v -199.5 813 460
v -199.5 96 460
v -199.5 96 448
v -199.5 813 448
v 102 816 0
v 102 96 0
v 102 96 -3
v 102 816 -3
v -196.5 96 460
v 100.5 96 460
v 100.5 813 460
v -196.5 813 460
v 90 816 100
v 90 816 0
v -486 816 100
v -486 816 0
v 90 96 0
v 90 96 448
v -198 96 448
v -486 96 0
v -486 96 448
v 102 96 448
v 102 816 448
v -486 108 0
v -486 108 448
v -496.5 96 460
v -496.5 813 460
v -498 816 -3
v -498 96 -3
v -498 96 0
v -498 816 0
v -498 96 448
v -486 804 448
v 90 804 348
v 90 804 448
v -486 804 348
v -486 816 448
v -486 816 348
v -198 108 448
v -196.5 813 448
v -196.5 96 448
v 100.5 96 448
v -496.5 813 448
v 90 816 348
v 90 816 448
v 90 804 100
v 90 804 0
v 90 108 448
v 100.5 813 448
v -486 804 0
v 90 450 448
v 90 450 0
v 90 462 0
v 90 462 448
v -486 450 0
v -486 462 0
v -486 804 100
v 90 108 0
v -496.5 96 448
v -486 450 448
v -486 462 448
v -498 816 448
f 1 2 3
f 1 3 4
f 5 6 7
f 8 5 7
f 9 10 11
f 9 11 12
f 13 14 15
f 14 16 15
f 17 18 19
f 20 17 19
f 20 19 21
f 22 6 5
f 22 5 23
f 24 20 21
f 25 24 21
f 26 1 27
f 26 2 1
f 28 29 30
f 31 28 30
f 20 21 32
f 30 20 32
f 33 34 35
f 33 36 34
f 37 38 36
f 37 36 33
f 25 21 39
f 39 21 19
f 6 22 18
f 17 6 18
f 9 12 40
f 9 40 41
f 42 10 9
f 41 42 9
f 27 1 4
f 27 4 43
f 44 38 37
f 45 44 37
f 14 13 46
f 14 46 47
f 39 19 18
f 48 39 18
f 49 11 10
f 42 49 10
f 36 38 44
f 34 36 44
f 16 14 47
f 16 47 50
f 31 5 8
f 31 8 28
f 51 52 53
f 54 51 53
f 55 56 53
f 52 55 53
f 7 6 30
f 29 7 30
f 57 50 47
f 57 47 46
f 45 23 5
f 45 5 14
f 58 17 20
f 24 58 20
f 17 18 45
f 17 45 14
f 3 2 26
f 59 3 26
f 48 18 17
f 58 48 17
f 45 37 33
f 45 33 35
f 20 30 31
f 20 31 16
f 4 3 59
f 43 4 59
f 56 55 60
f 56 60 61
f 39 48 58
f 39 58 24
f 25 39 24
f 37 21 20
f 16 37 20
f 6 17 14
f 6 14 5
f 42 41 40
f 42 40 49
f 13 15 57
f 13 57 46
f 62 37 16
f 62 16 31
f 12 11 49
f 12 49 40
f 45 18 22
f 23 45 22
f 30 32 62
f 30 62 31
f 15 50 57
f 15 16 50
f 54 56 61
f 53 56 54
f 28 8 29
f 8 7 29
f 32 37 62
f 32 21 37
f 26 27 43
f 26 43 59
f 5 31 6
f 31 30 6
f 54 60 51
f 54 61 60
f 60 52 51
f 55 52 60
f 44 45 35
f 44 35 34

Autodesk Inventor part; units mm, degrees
ref_plane "YZ Plane" through (0, 0, 0) normal (1, 0, 0) x (0, 1, 0)
sketch "Sketch1" plane through (0, 0, 0) normal (0, 0, 1) x (1, 0, 0)
  line L0 (-1498, 0) -> (1498, 0) construction
  line L1 (-1498, 0) -> (-898, 0)
  line L2 (-898, 0) -> (-898, 2068)
  line L3 (-898, 2068) -> (-1498, 2068)
  line L4 (-1498, 2068) -> (-1498, 0)
  line L5 (-898, 0) -> (-498, 0)
  line L6 (-498, 0) -> (-498, 816)
  line L7 (-498, 816) -> (-898, 816)
  line L8 (-898, 816) -> (-898, 0)
  line L9 (-498, 0) -> (102, 0)
  line L10 (102, 0) -> (102, 816)
  line L11 (102, 816) -> (-498, 816)
  line L12 (-498, 816) -> (-498, 0)
  line L13 (102, 0) -> (698, 0)
  line L14 (698, 0) -> (698, 668)
  line L15 (698, 668) -> (102, 668)
  line L16 (102, 668) -> (102, 0)
  line L17 (698, 0) -> (1498, 0)
  line L18 (1498, 0) -> (1498, 816)
  line L19 (1498, 816) -> (698, 816)
  line L20 (698, 816) -> (698, 0)
  line L21 (-1498, 0) -> (1498, 0)
  line L22 (1498, 0) -> (1498, 96)
  line L23 (1498, 96) -> (-1498, 96)
  line L24 (-1498, 96) -> (-1498, 0)
  line L25 (-898, 816) -> (1498, 816)
  line L26 (1498, 816) -> (1498, 832)
  line L27 (1498, 832) -> (-898, 832)
  line L28 (-898, 832) -> (-898, 816)
  line L29 (-898, 1972) -> (-498, 1972)
  line L30 (-498, 1972) -> (-498, 1372)
  line L31 (-498, 1372) -> (-898, 1372)
  line L32 (-898, 1372) -> (-898, 1972)
  line L33 (698, 1972) -> (1498, 1972)
  line L34 (1498, 1972) -> (1498, 1372)
  line L35 (1498, 1372) -> (698, 1372)
  line L36 (698, 1372) -> (698, 1972)
  line L37 (698, 1372) -> (98, 1372)
  line L38 (98, 1372) -> (98, 1972)
  line L39 (98, 1972) -> (698, 1972)
  line L40 (698, 1972) -> (698, 1372)
  line L41 (-498, 1372) -> (98, 1372)
  line L42 (-498, 1372) -> (-275, 1637.7611)
  line L43 (98, 1372) -> (-125, 1637.7611)
  line L44 (-275, 1637.7611) -> (-125, 1637.7611)
  line L45 (-125, 1637.7611) -> (-125, 2068)
  line L46 (-125, 2068) -> (-275, 2068)
  line L47 (-275, 2068) -> (-275, 1637.7611)
  line L48 (1098, 816) -> (1098, 96)
  line L49 (-198, 816) -> (-198, 96)
  line L50 (-898, 668) -> (-498, 668)
  line L51 (-1498, 520) -> (-898, 520)
  line L52 (-1498, 1579) -> (-898, 1579)
  line L53 (398, 1972) -> (398, 1372)
  line L54 (1098, 1972) -> (1098, 1372)
  line L55 (698, 1876) -> (1498, 1876)
  line L56 (698, 1468) -> (1498, 1468)
  line L57 (-1498, 1049.5) -> (-898, 1049.5)
  point P0 (0, 0)
  point P1 (0, 0)
  point P2 (0, 0)
  point P3 (-198, 816)
  point P4 (0, 0)
  dimension "d0" = 2996
  dimension "d1" = 600
  dimension "d2" = 2068
  dimension "d3" = 400
  dimension "d4" = 816
  dimension "d5" = 600
  dimension "d6" = 816
  dimension "d7" = 596
  dimension "d8" = 668
  dimension "d9" = 800
  dimension "d10" = 816
  dimension "d11" = 96
  dimension "d12" = 16
  dimension "d13" = 400
  dimension "d14" = 600
  dimension "d15" = 96
  dimension "d16" = 800
  dimension "d17" = 600
  dimension "d18" = 600
  dimension "d19" = 600
  dimension "d20" = 50
  dimension "d21" = 150
  dimension "d22" = 148
  dimension "d23" = 1059
  dimension "d24" = 96
  dimension "d25" = 96
  dimension "d26" = 529.5
ref_plane "Work Plane1" through (1498, 96, 0) normal (0, 1, 0) x (-1, 0, 0)
sketch "Sketch2" plane through (1498, 96, 0) normal (0, 1, 0) x (-1, 0, 0)
  line L0 (1996, 0) -> (1396, 0)
  line L1 (1396, 0) -> (1396, 460)
  line L2 (1396, 460) -> (1996, 460)
  line L3 (1996, 460) -> (1996, 0)
  line L4 (1984, 448) -> (1408, 448)
  line L5 (1408, 448) -> (1408, 12)
  line L6 (1408, 12) -> (1984, 12)
  line L7 (1984, 12) -> (1984, 448)
  line L8 (1984, 12) -> (1984, 0)
  line L9 (1408, 12) -> (1408, 0)
  line L10 (1408, 448) -> (1396, 448)
  line L11 (1984, 448) -> (1996, 448)
  point P0 (1498, 0)
  point P1 (1996, 0)
  point P2 (1396, 0)
  dimension "d28" = 460
  dimension "d29" = 12
extrude "Extrusion1" add sketch "Sketch2" along normal up to surface (720 mm away) contours L0 L8 L7 L11 L3 | L0 L1 L10 L5 L9
extrude "Extrusion2" add sketch "Sketch2" along normal up to surface (720 mm away) separate body contours L11 L4 L10 L1 L2 L3
split body "Split1" sketch "Sketch1" result two bodies bodies 2 curves L49 first body at (2, 336, 459.5)
sketch "Sketch3" plane through (1498, 96, 0) normal (0, 1, 0) x (-1, 0, 0)
  line L0 (1996, 0) -> (1996, 448) projected
  line L1 (1996, 0) -> (1396, 0)
  line L2 (1396, 0) -> (1396, -3)
  line L3 (1396, -3) -> (1996, -3)
  line L4 (1996, -3) -> (1996, 0)
  point P0 (1498, 0)
  dimension "d34" = 3
extrude "Extrusion3" add sketch "Sketch3" along normal up to surface (720 mm away) separate body
sketch "Sketch4" plane through (1498, 96, 0) normal (0, 1, 0) x (-1, 0, 0)
  line L0 (1984, 0) -> (1984, 448) projected
  line L1 (1396, 0) -> (1996, 0) projected
  line L2 (1408, 448) -> (1408, 0) projected
  line L3 (1996, 448) -> (1696, 448) projected
  line L4 (1696, 448) -> (1396, 448) projected
  point P0 (1498, 0)
extrude "Extrusion4" add sketch "Sketch4" along normal blind 12 separate body
ref_plane "Work Plane2" through (102, 816, 336) normal (0, -1, 0) x (0, 0, 1)
sketch "Sketch5" plane through (102, 816, 336) normal (0, -1, 0) x (0, 0, 1)
  line L0 (-336, 588) -> (112, 588) projected
  line L1 (112, 12) -> (-336, 12) projected
  line L2 (-336, 0) -> (-336, 600) projected
  line L3 (112, 600) -> (112, 300) projected
  line L4 (112, 300) -> (112, 0) projected
  line L5 (-236, 588) -> (-236, 12)
  line L6 (12, 588) -> (12, 12)
  point P0 (-336, 102)
  dimension "d39" = 100
  dimension "d40" = 100
extrude "Extrusion5" add sketch "Sketch5" along normal blind 12 separate body contours L0 L5 L1 L2 | L0 L3 L4 L1 L6
sketch "Sketch6" plane through (102, 96, 460) normal (0, 0, 1) x (1, 0, 0)
  line L0 (-600, 720) -> (-300, 720) projected
  line L1 (0, 0) -> (-300, 0) projected
  line L2 (-301.5, 720) -> (-298.5, 720)
  line L3 (-298.5, 720) -> (-298.5, 0)
  line L4 (-298.5, 0) -> (-301.5, 0)
  line L5 (-301.5, 0) -> (-301.5, 720)
  line L6 (-300, 0) -> (-300, 720) projected
  point P0 (-102, -96)
  point P1 (-300, 720)
  dimension "d43" = 1.5
  dimension "d44" = 1.5
extrude "Extrusion6" cut sketch "Sketch6" against normal blind 12 bodies 3 4
sketch "Sketch7" plane through (-498, 96, 0) normal (0, 0, 1) x (1, 0, 0)
  line L0 (12, 0) -> (12, 720) projected
  line L1 (588, 0) -> (588, 720) projected
  line L2 (12, 366) -> (588, 366)
  line L3 (588, 366) -> (588, 354)
  line L4 (588, 354) -> (12, 354)
  line L5 (12, 354) -> (12, 366)
  line L6 (12, 12) -> (588, 12) projected
  point P0 (498, -96)
  point P1 (12, 354)
  dimension "d47" = 342
  dimension "d48" = 12
extrude "Extrusion7" add sketch "Sketch7" along normal up to surface (448 mm away) separate body contours L0 L2 L1 L4
sketch "Sketch9" plane through (-498, 96, 460) normal (0, 0, 1) x (1, 0, 0)
  line L0 (0, 0) -> (0, 720) projected
  line L1 (600, 0) -> (600, 720) projected
  line L2 (0, 720) -> (600, 720)
  line L3 (600, 720) -> (600, 717)
  line L4 (600, 717) -> (0, 717)
  line L5 (0, 717) -> (0, 720)
  line L6 (0, 0) -> (298.5, 0) projected
  line L7 (0, 717) -> (1.5, 717)
  line L8 (1.5, 717) -> (1.5, 0)
  line L9 (1.5, 0) -> (0, 0)
  line L10 (0, 0) -> (0, 717)
  line L11 (600, 717) -> (598.5, 717)
  line L12 (598.5, 717) -> (598.5, 0)
  line L13 (598.5, 0) -> (600, 0)
  line L14 (600, 0) -> (600, 717)
  point P0 (498, -96)
  dimension "d55" = 3
  dimension "d56" = 1.5
  dimension "d57" = 1.5
extrude "Extrusion9" cut sketch "Sketch9" against normal blind 12 bodies 4 3
properties part number "Base Cabinet 3"
